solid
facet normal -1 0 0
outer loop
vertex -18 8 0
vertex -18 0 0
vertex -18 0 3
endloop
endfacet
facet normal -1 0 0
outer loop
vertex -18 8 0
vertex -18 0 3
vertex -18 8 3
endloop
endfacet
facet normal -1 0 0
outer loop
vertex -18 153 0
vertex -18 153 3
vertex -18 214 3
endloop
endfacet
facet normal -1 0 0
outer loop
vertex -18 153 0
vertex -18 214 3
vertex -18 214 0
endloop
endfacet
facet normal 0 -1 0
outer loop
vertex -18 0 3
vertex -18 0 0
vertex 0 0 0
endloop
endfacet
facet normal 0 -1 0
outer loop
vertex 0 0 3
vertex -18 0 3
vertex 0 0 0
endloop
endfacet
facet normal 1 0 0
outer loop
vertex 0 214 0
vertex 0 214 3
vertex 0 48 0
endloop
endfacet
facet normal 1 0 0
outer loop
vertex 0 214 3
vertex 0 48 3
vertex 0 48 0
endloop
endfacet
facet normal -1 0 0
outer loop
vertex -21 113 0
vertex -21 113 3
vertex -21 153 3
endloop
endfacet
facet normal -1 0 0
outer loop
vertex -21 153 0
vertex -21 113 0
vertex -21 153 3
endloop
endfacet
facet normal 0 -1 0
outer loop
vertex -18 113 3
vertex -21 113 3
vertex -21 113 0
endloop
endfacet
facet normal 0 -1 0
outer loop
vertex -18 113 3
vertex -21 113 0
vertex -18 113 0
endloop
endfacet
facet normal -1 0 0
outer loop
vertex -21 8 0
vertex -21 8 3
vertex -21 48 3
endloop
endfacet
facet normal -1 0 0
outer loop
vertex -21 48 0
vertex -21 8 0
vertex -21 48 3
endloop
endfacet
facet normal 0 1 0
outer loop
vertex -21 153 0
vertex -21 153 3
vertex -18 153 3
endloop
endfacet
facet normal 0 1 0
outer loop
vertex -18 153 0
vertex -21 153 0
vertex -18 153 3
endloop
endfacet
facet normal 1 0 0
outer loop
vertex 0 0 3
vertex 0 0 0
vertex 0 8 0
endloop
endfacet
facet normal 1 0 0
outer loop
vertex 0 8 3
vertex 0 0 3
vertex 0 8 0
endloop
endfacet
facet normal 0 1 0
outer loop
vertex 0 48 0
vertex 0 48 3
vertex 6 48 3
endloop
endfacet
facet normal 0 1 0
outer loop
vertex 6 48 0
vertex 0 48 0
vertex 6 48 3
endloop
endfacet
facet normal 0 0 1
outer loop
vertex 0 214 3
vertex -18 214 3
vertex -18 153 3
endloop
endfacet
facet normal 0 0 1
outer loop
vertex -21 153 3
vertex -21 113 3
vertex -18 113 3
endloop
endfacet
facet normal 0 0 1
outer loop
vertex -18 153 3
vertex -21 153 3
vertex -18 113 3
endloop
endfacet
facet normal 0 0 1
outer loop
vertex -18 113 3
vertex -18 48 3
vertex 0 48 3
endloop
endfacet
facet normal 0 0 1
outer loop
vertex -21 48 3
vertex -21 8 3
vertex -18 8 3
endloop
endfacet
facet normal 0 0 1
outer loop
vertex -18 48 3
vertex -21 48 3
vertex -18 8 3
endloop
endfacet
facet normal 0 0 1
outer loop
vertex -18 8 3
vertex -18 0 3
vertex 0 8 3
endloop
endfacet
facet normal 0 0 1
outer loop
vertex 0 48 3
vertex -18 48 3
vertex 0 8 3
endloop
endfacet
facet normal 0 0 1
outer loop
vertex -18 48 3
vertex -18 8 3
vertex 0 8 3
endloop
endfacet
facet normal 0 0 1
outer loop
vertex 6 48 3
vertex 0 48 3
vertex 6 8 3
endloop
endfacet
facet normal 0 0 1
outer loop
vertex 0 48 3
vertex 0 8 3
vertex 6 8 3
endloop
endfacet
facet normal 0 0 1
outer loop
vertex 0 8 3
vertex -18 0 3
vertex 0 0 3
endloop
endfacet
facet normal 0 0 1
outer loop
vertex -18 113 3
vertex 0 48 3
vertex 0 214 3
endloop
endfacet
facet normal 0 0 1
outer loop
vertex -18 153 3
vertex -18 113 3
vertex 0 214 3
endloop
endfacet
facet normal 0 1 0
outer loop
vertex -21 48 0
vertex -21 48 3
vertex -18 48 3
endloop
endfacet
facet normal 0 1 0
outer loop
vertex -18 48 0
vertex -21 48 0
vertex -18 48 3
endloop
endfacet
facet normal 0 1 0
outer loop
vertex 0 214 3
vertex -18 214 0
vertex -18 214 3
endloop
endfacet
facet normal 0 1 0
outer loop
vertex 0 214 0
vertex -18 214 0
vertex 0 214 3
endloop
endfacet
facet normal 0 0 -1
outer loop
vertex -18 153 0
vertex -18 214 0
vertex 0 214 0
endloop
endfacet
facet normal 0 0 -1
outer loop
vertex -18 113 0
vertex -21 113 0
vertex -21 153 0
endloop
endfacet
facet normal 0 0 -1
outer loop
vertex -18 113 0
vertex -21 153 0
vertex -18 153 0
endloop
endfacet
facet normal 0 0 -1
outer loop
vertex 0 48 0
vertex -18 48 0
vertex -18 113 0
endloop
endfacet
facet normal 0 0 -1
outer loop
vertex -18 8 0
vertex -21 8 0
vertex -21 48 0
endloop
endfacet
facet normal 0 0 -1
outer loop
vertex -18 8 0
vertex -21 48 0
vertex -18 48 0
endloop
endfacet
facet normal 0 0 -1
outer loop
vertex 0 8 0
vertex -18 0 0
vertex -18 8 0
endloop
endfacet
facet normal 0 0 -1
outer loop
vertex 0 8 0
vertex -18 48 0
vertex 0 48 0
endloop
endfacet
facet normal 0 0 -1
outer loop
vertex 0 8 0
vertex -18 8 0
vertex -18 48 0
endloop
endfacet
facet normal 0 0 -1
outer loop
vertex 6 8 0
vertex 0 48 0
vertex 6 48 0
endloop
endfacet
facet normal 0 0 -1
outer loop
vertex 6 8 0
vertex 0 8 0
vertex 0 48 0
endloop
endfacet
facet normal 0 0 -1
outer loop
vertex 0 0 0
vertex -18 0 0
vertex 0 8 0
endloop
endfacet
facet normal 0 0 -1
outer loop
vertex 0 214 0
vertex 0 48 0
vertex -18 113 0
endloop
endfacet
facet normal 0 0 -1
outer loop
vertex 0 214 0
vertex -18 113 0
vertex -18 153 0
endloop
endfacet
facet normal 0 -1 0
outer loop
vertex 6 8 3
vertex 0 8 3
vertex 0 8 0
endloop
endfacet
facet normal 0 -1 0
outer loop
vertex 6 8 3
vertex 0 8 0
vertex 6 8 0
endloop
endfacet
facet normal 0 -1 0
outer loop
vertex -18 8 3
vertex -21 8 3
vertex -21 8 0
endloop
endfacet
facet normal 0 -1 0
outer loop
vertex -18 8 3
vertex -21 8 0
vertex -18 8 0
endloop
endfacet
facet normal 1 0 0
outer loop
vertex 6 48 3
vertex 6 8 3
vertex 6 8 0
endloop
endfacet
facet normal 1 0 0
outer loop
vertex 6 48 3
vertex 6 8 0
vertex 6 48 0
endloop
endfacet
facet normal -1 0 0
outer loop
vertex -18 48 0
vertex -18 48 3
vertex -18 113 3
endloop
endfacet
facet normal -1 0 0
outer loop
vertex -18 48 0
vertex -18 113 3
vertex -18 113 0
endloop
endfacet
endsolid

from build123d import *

# Parameters (mm, degrees)
SKETCH1_W           = 18
SKETCH1_H           = 61
BASE_SHAPE_DEPTH    = 3
SKETCH2_W           = 6
SKETCH2_H           = 40
SKETCH2_W_2         = 3
FINGERS_DEPTH       = 3
SKETCH3_W           = 18
SKETCH3_H           = 3
BOSS_EXTRUDE1_DEPTH = 153
SKETCH4_W           = 3
SKETCH4_H           = 40
BOSS_EXTRUDE3_DEPTH = 3


with BuildPart() as part:
    # Sketch1 → Base Shape (new body)
    with BuildSketch(Plane.XY):
        with Locations((-9, 30.5)):
            Rectangle(SKETCH1_W, SKETCH1_H)
    extrude(amount=BASE_SHAPE_DEPTH)

    # Sketch2 → Fingers (add)
    with BuildSketch(Plane.XY.offset(3)):
        with Locations((3, 28)):
            Rectangle(SKETCH2_W, SKETCH2_H)
        with Locations((-19.5, 28)):
            Rectangle(SKETCH2_W_2, SKETCH2_H)
    extrude(amount=-FINGERS_DEPTH)

    # Sketch3 → Boss-Extrude1 (add)
    with BuildSketch(Plane(origin=(0, 61, 0), x_dir=(1, 0, 0), z_dir=(0, 1, 0))):
        with Locations((-9, -1.5)):
            Rectangle(SKETCH3_W, SKETCH3_H)
    extrude(amount=BOSS_EXTRUDE1_DEPTH)

    # Sketch4 → Boss-Extrude3 (add, through all)
    with BuildSketch(Plane.XY.offset(3)):
        with Locations((-19.5, 133)):
            Rectangle(SKETCH4_W, SKETCH4_H)
    extrude(amount=-BOSS_EXTRUDE3_DEPTH)


solid = part.part
